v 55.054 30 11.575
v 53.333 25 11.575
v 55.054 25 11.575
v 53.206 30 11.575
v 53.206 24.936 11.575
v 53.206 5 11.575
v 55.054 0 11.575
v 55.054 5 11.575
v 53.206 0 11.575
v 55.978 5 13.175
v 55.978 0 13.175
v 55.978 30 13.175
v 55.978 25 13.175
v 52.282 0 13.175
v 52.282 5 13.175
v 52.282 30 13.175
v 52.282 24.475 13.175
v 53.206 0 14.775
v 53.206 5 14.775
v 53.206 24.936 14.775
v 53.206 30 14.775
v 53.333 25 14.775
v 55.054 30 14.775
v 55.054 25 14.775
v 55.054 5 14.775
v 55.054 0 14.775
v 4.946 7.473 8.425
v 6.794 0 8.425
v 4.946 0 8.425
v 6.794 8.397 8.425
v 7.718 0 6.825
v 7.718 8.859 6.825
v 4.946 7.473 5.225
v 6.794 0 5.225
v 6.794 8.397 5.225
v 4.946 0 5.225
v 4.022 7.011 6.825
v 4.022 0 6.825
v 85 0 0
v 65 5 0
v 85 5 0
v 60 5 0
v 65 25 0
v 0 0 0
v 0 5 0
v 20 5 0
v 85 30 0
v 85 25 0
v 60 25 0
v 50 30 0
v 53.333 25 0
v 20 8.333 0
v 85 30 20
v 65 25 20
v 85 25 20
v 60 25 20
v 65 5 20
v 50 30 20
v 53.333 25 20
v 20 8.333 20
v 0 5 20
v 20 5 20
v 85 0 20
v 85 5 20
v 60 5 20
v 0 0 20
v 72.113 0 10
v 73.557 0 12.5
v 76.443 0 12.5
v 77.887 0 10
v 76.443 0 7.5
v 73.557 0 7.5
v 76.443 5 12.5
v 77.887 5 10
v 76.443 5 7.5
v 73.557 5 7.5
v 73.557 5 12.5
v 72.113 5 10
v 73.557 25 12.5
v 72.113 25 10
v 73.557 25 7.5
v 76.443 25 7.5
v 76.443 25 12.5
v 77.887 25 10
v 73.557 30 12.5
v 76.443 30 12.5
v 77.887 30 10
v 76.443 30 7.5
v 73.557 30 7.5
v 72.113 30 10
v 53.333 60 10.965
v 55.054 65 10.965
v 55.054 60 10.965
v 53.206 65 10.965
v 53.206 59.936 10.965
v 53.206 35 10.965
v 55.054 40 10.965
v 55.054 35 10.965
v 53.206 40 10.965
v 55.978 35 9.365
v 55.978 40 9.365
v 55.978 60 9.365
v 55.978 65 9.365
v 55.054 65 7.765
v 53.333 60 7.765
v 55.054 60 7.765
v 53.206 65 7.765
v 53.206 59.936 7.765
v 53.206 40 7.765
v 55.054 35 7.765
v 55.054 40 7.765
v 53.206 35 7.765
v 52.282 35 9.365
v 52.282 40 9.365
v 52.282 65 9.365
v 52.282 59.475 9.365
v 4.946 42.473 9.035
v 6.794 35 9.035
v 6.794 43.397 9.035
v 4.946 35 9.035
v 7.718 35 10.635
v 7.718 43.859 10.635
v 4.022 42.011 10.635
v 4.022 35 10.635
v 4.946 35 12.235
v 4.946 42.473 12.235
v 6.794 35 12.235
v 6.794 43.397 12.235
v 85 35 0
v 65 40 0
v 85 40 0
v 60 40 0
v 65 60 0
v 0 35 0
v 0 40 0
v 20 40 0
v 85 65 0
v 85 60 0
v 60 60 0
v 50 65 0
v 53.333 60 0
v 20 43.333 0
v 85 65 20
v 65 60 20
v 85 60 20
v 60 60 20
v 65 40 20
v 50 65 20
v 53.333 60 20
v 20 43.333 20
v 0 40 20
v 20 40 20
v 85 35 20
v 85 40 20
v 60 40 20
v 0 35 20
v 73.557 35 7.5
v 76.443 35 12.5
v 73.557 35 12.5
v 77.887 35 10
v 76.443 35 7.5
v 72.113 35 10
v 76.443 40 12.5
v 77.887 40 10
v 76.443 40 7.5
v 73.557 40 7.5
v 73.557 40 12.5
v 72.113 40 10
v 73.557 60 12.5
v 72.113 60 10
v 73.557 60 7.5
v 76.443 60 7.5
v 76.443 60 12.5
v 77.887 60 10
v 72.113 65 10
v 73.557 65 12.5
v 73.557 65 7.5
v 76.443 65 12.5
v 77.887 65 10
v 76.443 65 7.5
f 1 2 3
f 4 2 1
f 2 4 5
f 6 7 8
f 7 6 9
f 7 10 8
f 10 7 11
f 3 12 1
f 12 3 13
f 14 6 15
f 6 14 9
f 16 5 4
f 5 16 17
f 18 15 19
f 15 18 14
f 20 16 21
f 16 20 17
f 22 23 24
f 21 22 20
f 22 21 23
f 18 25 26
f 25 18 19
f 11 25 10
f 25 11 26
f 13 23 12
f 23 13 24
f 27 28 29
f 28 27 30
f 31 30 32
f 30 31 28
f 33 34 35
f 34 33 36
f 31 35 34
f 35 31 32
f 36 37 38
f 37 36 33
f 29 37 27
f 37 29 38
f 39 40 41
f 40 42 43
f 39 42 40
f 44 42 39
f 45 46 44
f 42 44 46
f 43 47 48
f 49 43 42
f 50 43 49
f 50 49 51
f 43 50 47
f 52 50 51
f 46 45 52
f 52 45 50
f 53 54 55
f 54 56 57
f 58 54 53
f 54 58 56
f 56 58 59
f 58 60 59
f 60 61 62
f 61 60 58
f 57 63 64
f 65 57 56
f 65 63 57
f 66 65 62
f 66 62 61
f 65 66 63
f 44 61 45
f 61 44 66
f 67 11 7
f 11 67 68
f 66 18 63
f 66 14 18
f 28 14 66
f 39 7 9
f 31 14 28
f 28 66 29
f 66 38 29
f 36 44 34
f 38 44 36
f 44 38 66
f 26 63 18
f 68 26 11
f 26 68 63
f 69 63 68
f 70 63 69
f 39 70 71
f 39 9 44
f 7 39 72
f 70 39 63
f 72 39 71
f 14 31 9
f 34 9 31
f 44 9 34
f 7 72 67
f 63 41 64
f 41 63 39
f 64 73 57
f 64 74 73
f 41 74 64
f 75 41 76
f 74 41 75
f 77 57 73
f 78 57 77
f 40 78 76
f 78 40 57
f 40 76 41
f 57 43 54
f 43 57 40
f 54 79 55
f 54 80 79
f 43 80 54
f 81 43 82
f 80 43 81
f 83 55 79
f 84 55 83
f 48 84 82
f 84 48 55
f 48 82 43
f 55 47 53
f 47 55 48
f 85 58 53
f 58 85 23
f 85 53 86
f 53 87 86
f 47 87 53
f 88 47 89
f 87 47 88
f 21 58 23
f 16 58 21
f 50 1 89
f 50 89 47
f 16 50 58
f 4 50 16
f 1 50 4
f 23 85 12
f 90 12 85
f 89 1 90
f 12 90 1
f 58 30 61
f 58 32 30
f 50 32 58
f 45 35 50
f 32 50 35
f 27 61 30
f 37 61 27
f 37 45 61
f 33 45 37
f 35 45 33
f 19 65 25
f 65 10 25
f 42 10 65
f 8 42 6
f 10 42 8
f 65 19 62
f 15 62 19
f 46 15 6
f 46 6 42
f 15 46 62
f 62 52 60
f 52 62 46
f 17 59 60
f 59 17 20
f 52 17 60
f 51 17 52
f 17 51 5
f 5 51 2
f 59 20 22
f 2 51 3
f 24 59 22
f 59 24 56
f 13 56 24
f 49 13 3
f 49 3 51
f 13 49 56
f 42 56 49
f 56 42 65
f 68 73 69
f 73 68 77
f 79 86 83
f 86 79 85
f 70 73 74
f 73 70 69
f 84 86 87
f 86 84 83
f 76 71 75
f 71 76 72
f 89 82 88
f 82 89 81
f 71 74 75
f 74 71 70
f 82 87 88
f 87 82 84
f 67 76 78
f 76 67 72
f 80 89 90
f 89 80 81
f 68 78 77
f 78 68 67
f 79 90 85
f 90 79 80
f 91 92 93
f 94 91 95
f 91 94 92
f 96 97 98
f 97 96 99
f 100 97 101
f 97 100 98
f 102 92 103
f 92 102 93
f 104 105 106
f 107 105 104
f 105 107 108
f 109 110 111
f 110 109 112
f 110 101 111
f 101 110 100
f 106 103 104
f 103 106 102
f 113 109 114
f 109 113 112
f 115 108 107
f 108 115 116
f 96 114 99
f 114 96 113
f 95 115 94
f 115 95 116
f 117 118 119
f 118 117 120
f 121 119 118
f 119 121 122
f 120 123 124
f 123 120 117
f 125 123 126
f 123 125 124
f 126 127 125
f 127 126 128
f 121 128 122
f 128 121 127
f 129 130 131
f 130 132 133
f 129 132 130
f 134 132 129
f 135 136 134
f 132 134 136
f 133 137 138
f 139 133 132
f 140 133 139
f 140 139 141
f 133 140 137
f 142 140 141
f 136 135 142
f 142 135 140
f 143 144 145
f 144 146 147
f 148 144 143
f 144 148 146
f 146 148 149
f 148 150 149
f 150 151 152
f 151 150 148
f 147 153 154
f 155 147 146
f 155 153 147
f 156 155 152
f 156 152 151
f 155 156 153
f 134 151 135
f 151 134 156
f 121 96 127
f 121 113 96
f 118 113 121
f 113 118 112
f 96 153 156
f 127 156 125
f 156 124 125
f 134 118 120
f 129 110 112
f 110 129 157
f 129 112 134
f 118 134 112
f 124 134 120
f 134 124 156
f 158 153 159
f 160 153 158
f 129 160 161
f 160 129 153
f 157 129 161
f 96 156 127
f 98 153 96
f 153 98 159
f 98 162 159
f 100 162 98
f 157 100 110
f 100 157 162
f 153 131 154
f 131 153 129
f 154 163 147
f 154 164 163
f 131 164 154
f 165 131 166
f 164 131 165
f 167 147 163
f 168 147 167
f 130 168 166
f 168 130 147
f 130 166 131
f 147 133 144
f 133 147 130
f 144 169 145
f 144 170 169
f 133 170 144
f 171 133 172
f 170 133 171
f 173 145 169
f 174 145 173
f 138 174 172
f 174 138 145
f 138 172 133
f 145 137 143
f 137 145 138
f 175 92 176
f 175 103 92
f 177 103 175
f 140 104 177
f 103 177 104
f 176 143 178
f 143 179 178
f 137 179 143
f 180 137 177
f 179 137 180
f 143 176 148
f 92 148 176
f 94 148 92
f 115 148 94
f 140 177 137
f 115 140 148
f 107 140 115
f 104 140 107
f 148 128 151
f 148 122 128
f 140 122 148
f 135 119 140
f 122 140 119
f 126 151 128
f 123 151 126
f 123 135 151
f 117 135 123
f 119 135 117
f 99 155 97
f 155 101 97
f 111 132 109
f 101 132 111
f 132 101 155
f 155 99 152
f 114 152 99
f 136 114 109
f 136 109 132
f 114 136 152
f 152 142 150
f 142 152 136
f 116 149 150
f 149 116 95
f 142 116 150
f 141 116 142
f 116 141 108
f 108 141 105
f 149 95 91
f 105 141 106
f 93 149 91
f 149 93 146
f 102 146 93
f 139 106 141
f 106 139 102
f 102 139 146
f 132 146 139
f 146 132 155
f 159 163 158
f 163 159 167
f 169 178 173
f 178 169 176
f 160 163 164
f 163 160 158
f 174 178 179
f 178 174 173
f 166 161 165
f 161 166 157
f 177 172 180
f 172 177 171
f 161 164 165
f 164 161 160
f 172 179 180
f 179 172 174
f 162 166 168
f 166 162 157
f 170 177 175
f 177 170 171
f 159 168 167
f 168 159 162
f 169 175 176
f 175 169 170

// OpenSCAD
// file: vars.scad
// Variables used throughout design.
// Yes, these could use some commenting.
// (c) 2014, Christopher "ScribbleJ" Jansen
huge=500;

printer_w = 400;
printer_l = 400;
printer_h = 400;

bearing_w = 7;
bearing_d = 22;
bearing_r = bearing_d/2;
bearing_hole_d = 8;
bearing_hole_r = bearing_hole_d/2;


misc_bolt_d = 3.2;
misc_bolt_r = misc_bolt_d/2;
misc_nut_r  = misc_bolt_d;
misc_bolt_pitch = 0.5;
misc_bolthead_d = misc_bolt_d*2;
misc_bolthead_r = misc_bolthead_d/2;

retainer_shell_thick = 0.5;
retainer_shell_sep   = 0.25;
//retainer_lip_thick   = 1;
retainer_lip_thick   = 2;
retainer_inner_width = 1;

belt_w    = 6;
belt_thick= 2;
belt_sep  = retainer_lip_thick*2 + 2;

calc_retainer_h  = retainer_lip_thick*2 + belt_w;
calc_retainer_ir = bearing_r + retainer_shell_thick*2 + retainer_shell_sep;
calc_retainer_or = calc_retainer_ir + belt_thick;
calc_retainer_b_off = retainer_lip_thick - (bearing_w-belt_w)/2;

tslot_w = 20;
tslot_bolt_d = 5;
tslot_bolt_r = tslot_bolt_d/2;
tslot_bolt_l = 4;
tslot_bolthead_d = 10;
tslot_bolthead_r = tslot_bolthead_d/2;


corner_thick = 5;
corner_length = tslot_w*3;

rod_d=8;
rod_r=rod_d/2;

bushing_d=15;
bushing_r=bushing_d/2;
bushing_l=10;
bushing_flange_r = bushing_r+3;
bushing_flange_w = 1;
bushing_material_thick = 5;

x_rod_sep = 50;
x_carriage_l = 50;
x_mount_sep_x = x_carriage_l - misc_bolthead_r*2*2 - misc_bolt_r*2;
x_mount_offset = bushing_r + misc_bolt_r * 2;
belt_above_x = bushing_r+misc_nut_r*2;
belt_clamp_w = 7;
x_rod_past_bearing = 20;

//belt_above_y = belt_above_x + x_rod_sep/2;
//y_above_x = belt_above_x-belt_above_y;
belt_above_y = 45;
y_above_x = belt_above_x-belt_above_y;




bearing_mount_base = corner_thick;
bearing_mount_extra = 2;
belt_above_bearing_mount = bearing_mount_base + bearing_mount_extra + retainer_lip_thick;
bearing_mount_support_tweak = 30;

y_bearing_offset = bushing_r+bushing_material_thick-calc_retainer_ir;

y_bearing_sep_y = calc_retainer_ir*2+belt_thick;
y_bearing_sep_z = belt_w+belt_sep;
bearing_bolt_r  = 4;
bearing_bolt_pitch = 1.25;
bearing_bolt_holder_thick = 4;
y_carriage_from_tslot = 2;

y_carriage_len = 50;

motor_w = 42.3;
motor_h = motor_w;
motor_bolt_sep = 31.0;
motor_bolt_r   = 1.5;
motor_pulley_d = 10;
motor_pulley_r = motor_pulley_d/2;
motor_pulley_h = 5.3;
motor_flange_d = 23;
motor_flange_r = motor_flange_d/2;
motor_corner_extra_hole_pos = tslot_bolt_r+3;

calc_corner_from_y_rod = x_rod_past_bearing+corner_thick+y_carriage_from_tslot+tslot_w;
calc_corner_above_x = belt_above_x - belt_above_bearing_mount + bearing_mount_base;

calc_motor1_above_x  = belt_above_x - motor_pulley_h;
calc_motor2_above_x  = belt_above_x - motor_pulley_h + belt_w + belt_sep;
calc_motor_from_y_rod = -bushing_r - bushing_material_thick + bearing_bolt_holder_thick + bearing_bolt_r + calc_retainer_or + motor_pulley_r;

motor_bracket_thick = 12;
motor_bracket_wide = (motor_w - motor_flange_d) / 2;
motor_bracket_len  = motor_w;
motor_bolt_offset  = (motor_w - motor_bolt_sep) / 2;

z_rod_sep = 150;
z_motor_off = motor_h - tslot_w - corner_thick;

laser_mat_thick = 4.75;
laser_mat_margin = laser_mat_thick;
bed_mount_sep   = 209;
bed_from_z      = 60;
bed_box_r       = 25;
bed_box_h       = 50;
z_ends_sep = printer_l - tslot_w*2 - corner_thick*2 - motor_w;
platform_l      =  laser_mat_margin*2 + laser_mat_thick*2 + bed_box_r*2 + z_ends_sep;
platform_w      = bed_mount_sep + misc_bolt_r*2 + laser_mat_margin*2;
z_leadscrew_passthrough_r = 12/2;
leadscrew_bolt_offset = 22/2;
leadscrew_bolt_r = 3.2/2;
laser_bushing_fudge = 0.1;


lm8uu_d=15;
lm8uu_r=lm8uu_d/2;
lm8uu_bolt_r=5/2;
lm8uu_nut_r=10/2;

arduino_width=60;
// file: common.scad
// Common functions used in various places throughout.
// (c) 2014, Christopher "ScribbleJ" Jansen
include <vars.scad>

// Reduce radius of holes intended to hold bolts by threads.
// 0.86603 * p = nominal depth of threads.  1/3-1/2 of that is about right.
function smallhole(r,p) = r - ((p*0.86603)/3);

// Polyhole derived from Nophead's Polyhole work: http://hydraraptor.blogspot.com/2011/02/polyholes.html
module polyhole(r,h,v=6,a=0)
{
  rotate([0,0,a]) cylinder( h = h, r = r  / cos( 180 / v ), $fn = v );
}
// 2D version of Polyhole
module polycircle(r,v=6,a=0)
{
  rotate([0,0,a]) circle(r = r  / cos( 180 / v ), $fn = v );
}
// Cutout for bolthole
module bolt(bolt_r = misc_bolt_r,bolthead_r = misc_bolthead_r,bolt_len = huge,v=6,a=0)
{
  translate([0,0,-bolt_len]) polyhole(r=bolt_r,h=bolt_len+1,v=v,a=a);
  polyhole(r=bolthead_r,h=huge,v=v,a=a);
}
// 2D ring
module ring(inner=5,outer=10,v=32)
{
  difference()
  {
    circle(r=outer);
    polycircle(r=inner,v=v);
  }
} 
// 2D Rounded square
module roundsquare(dim=[50,50],r=5)
{
  translate([0,r]) square([dim[0], dim[1] - r*2]);
  translate([r,0]) square([dim[0] - r*2, dim[1]]);
  for(x=[r,dim[0]-r])
  for(y=[r,dim[1]-r])
    translate([x,y]) circle(r=r);
}
// Lasercutting Tabs
module maketabs(l=100,w=5,num=10)
{
  tablength=l/(num * 2);
  for(x=[tablength/2:tablength*2:l])
    translate([x,0]) square([tablength,w]);
}
// Support for printing bearing mount
module support(l=bearing_mount_base+bearing_mount_extra+y_bearing_sep_z+calc_retainer_b_off,w=bearing_hole_d * tan(180/6) *2,extra=0,extra_l=0)
{
  translate([-w/2,0,-l]) 
  {
    difference()
    {
      rotate([45,0,0]) cube([w,huge/2,huge/2]);
      translate([-huge/2,0,0]) cube([huge,huge,huge]);
      translate([-huge/2,-huge/2,l]) cube([huge,huge,huge]);
    }
    translate([0,-extra,-extra_l/2]) cube([w,extra,extra_l]);
  }

}
// main file
// Brackets for mounting RAMPS/Arduino Mega on T-slot.  
// Print 1 of brace(false), 1 of brace(true)
// (c) 2014, Christopher "ScribbleJ" Jansen
include <common.scad>

brace(true);
translate([0,tslot_w+corner_thick*3,0]) brace();

// Clip to hold fan - needs some work.
module fanmount()
{
  difference()
  {
    union()
    {
      translate([-10,0,0]) cube([60,40,corner_thick]);
      translate([20,0,0])
      for(x=[-59/2-corner_thick,59/2])
      {
        translate([x,0,0]) cube([corner_thick,40,50]);
      }
    }

    translate([20,0,0])
    {
      for(x=[-59/2+1,59/2-1])
      {
        translate([x,0,46]) rotate([-90,0,0]) polyhole(r=2,h=40); //([1,40,2]);
      }
      for(x=[32/2,-32/2])
      for(y=[32/2,-32/2])
      {
        translate([x,y+20,-1]) polyhole(r=misc_bolt_r,h=huge);
      }
      translate([0,20,-1]) polyhole(r=36/2,h=huge,v=16);

      for(x=[50/2,-50/2])
      for(y=[32/2,-32/2])
      {
        translate([x,y+20,-1]) polyhole(r=misc_bolt_r,h=huge);
        translate([-huge/2,y+20,corner_thick+5]) rotate([0,90,0]) polyhole(r=misc_bolt_r, h=huge);
      }

    }

  }
}

module brace(which=false)
{
  bolt_sep_z=which?96.52-90.17:13.97-15.24;
  bolt_sep_x=50.8-2.54;
  difference()
  {
    linear_extrude(height=tslot_w) 2dbracket();

    translate([arduino_width+corner_thick+tslot_w/2,-1,tslot_w/2]) rotate([-90,0,0]) polyhole(r=tslot_bolt_r,h=huge);
    translate([arduino_width/2,-1,tslot_w/2])
    {
      translate([bolt_sep_x/2,0,bolt_sep_z/2]) rotate([-90,0,0]) polyhole(r=misc_bolt_r,h=huge);
      translate([-bolt_sep_x/2,0,-bolt_sep_z/2]) rotate([-90,0,0]) polyhole(r=misc_bolt_r,h=huge);
    }
  }
}
module 2dbracket()
{
  difference()
  {
    tri();
    translate([corner_thick*4,corner_thick]) 
    //scale([(arduino_width-corner_thick*2)/arduino_width,tslot_w/(tslot_w+corner_thick*2)]) 
      scale([tslot_w/(tslot_w+corner_thick*2),tslot_w/(tslot_w+corner_thick*2)])
      tri();
  }

  translate([arduino_width,0]) difference()
  {
    square([tslot_w+corner_thick,tslot_w+corner_thick*2]);
    translate([corner_thick,corner_thick]) square([tslot_w,tslot_w]);
  }
}


module tri()
{
  difference()
  {
    square([arduino_width,tslot_w+corner_thick*2]);
    translate([0,corner_thick]) rotate(atan((tslot_w+corner_thick*2)/arduino_width)) square([huge,huge]);
  }
}
